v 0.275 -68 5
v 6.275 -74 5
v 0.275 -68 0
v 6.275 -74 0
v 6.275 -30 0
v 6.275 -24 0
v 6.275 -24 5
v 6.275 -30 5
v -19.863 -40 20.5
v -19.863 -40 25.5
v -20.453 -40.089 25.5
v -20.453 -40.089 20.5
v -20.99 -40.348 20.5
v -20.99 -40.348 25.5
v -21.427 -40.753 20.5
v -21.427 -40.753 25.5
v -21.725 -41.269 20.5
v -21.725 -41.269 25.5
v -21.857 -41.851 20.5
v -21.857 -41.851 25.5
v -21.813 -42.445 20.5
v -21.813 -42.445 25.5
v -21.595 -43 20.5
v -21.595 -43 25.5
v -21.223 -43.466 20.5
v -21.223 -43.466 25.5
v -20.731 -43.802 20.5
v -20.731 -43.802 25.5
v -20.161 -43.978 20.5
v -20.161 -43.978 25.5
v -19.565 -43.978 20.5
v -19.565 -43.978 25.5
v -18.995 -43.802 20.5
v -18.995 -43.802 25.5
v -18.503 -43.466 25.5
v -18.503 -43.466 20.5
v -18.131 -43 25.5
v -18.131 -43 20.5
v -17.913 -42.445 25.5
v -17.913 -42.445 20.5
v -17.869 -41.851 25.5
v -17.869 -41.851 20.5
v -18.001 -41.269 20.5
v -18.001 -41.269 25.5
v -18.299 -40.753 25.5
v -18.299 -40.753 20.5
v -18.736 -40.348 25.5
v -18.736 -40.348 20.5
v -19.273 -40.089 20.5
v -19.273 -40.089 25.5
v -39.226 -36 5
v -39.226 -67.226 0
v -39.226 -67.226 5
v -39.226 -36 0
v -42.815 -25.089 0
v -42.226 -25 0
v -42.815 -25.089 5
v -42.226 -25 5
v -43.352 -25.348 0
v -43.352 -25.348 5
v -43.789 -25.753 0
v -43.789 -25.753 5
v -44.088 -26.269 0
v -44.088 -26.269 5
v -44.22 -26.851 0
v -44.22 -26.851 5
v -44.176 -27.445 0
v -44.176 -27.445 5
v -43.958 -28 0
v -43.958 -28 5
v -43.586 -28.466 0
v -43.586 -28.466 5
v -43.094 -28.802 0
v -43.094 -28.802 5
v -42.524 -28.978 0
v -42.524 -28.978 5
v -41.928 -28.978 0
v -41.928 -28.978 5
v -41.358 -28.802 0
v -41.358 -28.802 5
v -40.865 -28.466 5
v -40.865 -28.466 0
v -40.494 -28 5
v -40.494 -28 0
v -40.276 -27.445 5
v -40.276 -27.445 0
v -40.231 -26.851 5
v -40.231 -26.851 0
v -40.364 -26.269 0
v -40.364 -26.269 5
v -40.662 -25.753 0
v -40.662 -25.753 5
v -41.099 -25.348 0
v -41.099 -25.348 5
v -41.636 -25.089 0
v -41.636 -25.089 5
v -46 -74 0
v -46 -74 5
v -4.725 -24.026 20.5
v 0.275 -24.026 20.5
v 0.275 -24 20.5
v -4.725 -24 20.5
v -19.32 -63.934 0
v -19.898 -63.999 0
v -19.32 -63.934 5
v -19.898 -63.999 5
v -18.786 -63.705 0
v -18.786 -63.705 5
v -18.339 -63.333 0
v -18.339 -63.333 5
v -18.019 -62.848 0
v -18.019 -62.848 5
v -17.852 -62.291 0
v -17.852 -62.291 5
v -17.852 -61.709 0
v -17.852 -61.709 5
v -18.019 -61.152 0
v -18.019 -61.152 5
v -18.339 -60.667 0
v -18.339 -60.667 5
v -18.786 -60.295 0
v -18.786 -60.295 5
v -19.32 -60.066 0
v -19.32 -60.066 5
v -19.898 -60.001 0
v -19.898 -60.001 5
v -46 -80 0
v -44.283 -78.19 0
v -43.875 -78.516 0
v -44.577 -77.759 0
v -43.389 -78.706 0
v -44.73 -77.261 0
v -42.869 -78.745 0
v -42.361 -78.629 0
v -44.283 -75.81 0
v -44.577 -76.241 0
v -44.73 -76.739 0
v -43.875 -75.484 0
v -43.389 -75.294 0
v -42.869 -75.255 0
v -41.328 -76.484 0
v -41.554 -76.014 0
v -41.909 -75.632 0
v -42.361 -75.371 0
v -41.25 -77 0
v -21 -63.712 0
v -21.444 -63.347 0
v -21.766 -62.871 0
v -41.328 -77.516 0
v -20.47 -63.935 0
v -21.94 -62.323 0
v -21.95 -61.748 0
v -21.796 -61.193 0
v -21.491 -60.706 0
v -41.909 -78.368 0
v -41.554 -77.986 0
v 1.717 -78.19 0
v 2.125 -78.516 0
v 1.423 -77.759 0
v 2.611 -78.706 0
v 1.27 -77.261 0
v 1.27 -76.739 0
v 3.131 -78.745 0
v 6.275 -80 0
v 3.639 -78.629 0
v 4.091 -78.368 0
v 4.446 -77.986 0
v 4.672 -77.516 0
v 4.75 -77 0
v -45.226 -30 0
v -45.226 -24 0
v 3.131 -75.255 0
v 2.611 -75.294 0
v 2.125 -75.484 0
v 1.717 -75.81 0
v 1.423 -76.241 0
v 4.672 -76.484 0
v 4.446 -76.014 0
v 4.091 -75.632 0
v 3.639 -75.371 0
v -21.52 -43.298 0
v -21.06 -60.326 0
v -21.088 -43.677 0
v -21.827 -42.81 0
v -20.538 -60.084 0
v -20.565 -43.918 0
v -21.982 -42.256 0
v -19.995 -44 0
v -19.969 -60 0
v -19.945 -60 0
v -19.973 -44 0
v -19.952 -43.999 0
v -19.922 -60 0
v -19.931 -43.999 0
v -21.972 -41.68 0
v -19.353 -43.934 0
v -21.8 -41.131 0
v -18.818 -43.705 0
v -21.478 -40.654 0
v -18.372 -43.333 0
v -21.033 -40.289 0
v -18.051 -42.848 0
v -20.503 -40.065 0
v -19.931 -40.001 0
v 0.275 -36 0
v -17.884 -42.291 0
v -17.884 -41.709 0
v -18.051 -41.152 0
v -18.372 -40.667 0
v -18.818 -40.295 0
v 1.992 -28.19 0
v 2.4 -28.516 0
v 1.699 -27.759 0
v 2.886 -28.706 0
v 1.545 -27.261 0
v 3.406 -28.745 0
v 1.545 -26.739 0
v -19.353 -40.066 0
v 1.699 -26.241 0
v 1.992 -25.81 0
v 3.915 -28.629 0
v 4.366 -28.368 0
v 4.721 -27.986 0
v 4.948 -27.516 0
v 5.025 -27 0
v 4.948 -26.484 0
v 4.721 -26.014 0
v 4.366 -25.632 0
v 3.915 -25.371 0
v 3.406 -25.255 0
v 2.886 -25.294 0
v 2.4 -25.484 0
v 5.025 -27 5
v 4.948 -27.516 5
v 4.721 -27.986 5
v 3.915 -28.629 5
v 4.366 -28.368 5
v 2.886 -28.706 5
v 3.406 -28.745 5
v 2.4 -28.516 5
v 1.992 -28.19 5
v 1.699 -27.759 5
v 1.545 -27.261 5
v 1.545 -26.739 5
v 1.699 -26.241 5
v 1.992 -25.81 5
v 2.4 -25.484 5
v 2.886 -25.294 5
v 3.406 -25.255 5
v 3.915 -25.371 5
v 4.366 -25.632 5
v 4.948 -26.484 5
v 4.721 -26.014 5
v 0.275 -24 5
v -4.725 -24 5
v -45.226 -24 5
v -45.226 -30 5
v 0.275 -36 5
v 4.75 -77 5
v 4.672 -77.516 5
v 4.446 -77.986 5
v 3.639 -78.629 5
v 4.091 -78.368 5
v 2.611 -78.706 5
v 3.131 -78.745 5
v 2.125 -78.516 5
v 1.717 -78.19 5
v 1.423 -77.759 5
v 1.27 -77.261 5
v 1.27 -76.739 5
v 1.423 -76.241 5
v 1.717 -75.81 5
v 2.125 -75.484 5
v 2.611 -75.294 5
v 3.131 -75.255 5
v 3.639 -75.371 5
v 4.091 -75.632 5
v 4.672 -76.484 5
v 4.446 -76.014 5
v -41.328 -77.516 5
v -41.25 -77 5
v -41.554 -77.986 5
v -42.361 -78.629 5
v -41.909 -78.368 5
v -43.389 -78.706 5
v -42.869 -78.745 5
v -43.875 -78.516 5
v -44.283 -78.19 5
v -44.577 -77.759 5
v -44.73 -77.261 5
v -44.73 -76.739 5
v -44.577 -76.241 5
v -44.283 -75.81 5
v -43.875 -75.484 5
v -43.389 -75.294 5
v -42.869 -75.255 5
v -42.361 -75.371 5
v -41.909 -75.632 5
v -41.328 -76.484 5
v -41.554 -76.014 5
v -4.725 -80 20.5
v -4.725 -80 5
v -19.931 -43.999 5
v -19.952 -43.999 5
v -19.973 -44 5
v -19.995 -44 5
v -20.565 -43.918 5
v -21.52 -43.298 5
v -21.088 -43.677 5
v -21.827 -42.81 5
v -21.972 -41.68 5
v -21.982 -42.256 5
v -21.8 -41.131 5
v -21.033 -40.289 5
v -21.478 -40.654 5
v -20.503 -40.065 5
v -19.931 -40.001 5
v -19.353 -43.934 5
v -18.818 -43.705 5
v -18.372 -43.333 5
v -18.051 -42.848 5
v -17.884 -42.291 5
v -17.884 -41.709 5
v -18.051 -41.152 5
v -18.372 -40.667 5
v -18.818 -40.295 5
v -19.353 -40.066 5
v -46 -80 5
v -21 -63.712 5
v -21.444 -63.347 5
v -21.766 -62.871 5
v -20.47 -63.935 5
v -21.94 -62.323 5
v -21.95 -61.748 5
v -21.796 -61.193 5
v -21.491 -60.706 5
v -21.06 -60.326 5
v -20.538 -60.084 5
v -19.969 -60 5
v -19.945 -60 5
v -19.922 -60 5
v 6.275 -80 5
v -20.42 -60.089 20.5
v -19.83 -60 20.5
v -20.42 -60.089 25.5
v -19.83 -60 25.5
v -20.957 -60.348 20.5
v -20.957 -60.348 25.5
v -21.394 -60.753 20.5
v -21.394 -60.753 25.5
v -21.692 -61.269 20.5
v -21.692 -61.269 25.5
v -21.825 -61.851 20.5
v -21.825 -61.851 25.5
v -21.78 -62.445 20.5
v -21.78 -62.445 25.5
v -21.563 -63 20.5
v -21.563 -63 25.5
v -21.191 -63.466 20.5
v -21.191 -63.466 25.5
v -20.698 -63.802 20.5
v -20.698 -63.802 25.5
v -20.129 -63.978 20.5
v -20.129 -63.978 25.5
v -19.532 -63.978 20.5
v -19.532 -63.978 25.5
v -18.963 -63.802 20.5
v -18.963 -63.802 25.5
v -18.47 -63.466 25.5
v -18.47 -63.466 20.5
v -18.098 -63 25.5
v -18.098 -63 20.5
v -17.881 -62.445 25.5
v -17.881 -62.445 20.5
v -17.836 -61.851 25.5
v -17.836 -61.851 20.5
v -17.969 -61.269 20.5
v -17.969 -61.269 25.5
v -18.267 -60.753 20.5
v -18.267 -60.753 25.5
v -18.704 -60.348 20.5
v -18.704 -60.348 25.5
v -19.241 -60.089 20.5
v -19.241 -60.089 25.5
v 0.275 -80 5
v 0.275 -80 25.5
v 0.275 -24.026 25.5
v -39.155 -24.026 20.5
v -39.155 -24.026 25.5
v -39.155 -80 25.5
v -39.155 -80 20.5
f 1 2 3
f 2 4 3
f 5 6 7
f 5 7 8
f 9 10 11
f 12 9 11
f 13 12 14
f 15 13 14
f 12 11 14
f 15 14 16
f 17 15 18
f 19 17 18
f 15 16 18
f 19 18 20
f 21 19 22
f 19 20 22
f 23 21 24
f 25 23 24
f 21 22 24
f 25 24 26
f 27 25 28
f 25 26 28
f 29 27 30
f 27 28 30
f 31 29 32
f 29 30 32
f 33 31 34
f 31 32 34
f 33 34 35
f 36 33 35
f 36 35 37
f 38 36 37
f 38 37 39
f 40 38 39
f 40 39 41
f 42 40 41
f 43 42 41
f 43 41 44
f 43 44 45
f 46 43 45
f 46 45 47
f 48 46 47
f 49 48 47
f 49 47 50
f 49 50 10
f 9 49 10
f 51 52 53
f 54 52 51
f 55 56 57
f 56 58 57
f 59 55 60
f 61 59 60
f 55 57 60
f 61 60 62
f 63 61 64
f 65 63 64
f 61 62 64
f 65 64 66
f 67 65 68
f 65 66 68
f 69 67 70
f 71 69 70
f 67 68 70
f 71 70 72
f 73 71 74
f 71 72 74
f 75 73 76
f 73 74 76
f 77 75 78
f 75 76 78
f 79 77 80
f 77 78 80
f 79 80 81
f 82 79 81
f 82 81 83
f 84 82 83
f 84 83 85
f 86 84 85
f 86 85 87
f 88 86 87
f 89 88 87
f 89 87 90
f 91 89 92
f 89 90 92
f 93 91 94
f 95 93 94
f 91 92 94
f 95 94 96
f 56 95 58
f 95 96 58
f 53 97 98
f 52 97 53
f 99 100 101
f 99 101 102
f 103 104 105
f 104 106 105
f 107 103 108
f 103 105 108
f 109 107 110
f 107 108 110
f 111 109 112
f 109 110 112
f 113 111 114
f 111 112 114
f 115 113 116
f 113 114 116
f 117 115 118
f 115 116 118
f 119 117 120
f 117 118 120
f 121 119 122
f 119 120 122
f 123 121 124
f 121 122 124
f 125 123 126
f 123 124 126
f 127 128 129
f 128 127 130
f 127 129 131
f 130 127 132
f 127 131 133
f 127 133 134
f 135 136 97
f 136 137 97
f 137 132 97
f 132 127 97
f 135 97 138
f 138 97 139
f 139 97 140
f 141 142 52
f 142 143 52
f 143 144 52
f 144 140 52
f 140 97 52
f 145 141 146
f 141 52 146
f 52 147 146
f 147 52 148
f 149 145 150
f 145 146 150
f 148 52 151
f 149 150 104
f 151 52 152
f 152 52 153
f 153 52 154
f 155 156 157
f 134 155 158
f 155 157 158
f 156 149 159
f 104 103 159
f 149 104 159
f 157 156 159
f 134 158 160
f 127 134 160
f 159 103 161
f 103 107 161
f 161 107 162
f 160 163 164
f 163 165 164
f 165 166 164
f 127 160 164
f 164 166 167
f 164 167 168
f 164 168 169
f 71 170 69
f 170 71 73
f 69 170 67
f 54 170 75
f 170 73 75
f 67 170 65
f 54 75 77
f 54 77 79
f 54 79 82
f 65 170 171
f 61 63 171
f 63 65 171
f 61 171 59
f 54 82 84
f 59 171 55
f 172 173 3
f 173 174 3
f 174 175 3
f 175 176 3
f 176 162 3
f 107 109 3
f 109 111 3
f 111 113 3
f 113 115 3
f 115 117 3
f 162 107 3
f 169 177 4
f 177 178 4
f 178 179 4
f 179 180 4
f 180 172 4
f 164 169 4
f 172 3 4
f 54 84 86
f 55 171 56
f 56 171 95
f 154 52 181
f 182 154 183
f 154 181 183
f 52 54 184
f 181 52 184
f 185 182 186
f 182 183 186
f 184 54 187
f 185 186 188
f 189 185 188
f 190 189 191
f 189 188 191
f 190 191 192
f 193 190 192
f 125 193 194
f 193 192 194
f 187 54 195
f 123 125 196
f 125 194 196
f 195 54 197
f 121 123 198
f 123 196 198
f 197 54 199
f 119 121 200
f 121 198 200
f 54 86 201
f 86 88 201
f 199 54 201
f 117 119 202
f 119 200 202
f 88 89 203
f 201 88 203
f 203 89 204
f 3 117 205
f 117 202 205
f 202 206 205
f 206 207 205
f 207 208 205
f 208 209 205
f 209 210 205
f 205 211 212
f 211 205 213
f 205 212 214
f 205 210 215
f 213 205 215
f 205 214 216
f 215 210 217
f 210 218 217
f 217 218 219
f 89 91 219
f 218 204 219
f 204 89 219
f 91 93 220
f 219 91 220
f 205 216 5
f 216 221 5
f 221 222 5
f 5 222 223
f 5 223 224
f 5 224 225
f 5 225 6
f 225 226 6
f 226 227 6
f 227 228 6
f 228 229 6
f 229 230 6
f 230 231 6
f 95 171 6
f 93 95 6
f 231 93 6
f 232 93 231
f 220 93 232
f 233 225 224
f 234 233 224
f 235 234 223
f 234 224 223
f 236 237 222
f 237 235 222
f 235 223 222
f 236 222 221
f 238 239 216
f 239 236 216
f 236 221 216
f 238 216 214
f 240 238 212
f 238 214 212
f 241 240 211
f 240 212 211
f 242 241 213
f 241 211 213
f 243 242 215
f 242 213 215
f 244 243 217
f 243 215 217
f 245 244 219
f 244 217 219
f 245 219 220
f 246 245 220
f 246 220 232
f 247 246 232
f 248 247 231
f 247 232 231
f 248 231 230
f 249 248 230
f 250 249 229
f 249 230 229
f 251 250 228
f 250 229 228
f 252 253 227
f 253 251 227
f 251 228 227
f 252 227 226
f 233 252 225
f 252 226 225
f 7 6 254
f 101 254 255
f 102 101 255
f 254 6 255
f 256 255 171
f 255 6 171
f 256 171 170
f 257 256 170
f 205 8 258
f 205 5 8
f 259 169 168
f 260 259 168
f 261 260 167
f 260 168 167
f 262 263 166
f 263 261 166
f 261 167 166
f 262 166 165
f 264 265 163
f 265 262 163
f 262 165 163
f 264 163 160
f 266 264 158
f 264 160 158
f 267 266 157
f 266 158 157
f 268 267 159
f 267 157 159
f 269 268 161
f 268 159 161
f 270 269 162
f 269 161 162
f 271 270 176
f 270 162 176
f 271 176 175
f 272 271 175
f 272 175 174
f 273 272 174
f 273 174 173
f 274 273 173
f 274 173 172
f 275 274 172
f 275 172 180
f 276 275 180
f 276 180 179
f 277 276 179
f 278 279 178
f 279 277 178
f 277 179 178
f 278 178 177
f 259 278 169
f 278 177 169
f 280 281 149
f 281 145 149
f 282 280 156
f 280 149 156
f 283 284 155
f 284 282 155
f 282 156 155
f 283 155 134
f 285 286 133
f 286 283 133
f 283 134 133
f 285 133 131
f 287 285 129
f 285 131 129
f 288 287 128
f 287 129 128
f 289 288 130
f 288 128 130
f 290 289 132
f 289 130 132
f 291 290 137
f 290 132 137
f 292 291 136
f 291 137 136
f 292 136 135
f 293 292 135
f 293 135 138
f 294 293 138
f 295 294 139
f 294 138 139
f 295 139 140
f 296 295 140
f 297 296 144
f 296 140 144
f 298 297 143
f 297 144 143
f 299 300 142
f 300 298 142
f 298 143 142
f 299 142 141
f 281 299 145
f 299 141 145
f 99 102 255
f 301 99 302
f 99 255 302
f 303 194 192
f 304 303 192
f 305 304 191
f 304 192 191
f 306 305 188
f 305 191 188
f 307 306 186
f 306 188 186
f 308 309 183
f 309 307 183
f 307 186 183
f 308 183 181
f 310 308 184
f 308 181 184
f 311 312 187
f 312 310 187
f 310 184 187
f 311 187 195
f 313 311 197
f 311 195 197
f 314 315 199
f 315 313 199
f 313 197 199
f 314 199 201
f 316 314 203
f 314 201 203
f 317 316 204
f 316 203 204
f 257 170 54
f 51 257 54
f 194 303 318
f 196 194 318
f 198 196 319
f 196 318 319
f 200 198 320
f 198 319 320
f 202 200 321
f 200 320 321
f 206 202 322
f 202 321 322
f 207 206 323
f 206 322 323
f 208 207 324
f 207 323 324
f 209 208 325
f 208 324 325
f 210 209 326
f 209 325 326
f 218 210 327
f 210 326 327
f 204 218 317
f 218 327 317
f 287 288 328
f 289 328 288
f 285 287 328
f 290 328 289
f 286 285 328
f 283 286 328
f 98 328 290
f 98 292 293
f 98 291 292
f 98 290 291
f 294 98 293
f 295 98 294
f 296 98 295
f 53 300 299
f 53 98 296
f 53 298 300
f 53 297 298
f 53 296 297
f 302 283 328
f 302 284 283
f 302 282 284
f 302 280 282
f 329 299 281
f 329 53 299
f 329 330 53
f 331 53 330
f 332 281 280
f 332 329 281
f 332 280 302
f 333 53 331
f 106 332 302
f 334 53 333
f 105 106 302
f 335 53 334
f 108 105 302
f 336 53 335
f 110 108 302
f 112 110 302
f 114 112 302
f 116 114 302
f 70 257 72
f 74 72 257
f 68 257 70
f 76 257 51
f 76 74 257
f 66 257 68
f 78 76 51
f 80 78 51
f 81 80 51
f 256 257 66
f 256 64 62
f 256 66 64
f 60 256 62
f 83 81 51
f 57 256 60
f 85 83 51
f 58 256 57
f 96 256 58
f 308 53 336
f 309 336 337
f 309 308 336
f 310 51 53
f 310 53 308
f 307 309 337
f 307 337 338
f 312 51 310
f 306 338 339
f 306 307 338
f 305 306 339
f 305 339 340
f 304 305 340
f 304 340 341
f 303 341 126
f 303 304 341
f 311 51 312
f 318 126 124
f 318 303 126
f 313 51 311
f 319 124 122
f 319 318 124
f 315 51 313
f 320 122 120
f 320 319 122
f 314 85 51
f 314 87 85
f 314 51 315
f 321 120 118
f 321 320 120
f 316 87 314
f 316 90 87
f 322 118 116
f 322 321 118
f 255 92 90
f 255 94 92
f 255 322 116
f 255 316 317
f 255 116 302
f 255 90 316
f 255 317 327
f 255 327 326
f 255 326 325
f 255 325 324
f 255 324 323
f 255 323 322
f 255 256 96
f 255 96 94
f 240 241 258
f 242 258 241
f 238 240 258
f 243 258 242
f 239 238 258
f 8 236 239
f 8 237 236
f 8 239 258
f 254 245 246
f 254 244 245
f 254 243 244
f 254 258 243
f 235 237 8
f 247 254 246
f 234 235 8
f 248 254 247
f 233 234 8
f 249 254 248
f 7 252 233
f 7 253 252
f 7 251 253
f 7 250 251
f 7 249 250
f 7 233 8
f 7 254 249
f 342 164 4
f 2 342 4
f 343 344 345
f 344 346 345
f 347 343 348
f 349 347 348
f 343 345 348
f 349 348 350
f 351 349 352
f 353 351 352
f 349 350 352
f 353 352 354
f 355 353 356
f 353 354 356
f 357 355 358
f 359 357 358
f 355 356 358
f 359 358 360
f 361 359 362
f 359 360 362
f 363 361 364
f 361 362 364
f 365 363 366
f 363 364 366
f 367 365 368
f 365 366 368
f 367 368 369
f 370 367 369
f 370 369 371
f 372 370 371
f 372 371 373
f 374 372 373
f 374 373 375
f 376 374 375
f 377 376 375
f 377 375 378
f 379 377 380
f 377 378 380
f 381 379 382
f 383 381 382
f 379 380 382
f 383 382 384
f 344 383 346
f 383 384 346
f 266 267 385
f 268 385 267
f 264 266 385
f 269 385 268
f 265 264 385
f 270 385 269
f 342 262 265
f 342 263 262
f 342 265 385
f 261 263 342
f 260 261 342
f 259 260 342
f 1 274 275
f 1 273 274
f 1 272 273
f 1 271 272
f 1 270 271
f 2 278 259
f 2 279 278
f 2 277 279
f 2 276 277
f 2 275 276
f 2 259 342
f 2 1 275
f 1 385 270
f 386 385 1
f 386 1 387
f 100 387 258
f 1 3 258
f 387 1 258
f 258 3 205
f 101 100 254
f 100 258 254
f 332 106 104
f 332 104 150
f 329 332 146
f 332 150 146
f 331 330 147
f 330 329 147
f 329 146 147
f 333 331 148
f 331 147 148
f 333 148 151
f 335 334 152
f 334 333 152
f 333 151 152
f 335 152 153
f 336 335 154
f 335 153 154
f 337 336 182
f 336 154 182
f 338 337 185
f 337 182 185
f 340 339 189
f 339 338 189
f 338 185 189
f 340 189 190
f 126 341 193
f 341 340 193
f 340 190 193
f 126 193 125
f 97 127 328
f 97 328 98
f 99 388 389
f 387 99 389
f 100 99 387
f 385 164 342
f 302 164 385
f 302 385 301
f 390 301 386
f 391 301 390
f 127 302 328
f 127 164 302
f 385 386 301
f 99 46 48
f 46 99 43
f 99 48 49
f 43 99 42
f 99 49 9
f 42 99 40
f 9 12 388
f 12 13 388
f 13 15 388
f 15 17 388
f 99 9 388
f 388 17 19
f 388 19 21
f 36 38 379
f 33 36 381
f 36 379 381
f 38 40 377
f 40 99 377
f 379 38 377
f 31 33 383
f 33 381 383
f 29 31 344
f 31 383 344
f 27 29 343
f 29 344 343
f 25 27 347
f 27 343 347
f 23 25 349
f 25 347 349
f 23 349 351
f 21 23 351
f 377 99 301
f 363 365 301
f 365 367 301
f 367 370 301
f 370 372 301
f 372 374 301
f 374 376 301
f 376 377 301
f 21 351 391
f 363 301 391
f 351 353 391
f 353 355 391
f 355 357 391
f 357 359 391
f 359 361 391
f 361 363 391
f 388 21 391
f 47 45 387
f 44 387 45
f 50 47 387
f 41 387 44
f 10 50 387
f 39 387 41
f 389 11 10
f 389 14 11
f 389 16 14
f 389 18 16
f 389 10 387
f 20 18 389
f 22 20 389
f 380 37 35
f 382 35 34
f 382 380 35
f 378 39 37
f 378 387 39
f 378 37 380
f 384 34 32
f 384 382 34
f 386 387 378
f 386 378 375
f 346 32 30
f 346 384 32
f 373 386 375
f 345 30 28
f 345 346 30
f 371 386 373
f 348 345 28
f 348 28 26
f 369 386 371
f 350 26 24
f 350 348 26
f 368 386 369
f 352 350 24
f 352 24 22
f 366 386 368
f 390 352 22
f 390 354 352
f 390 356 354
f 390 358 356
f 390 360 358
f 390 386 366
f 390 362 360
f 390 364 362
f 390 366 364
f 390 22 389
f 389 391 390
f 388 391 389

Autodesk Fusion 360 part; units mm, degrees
sketch "Sketch1" plane through (0, 0, 0) normal (0, 0, 1) x (1, 0, 0)
  circle A0 centre (-19.9657, -62) radius 2
  line L0 (6.2753, -74) -> (14.4853, -74) construction
  line L1 (0.2753, -24) -> (-39.2258, -24)
  line L2 (6.2753, -74) -> (0.2753, -68)
  line L3 (-39.2258, -80) -> (-39.2258, -52)
  circle A1 centre (3, -77) radius 1.75
  circle A2 centre (-43, -77) radius 1.75
  line L4 (6.2753, -80) -> (6.2753, -74)
  line L5 (0.2753, -80) -> (6.2753, -80)
  line L6 (0.2753, -52) -> (0.2753, -24)
  line L7 (-46, -80) -> (-46, -74)
  line L8 (-39.2258, -80) -> (-46, -80)
  circle A3 centre (3.2753, -27) radius 1.75
  line L9 (-39.2258, -24) -> (-45.2258, -24)
  line L10 (6.2753, -30) -> (0.2753, -36)
  line L11 (-45.2258, -24) -> (-45.2258, -30)
  line L12 (0.2753, -24) -> (6.2753, -24)
  line L13 (-45.2258, -30) -> (-37.5147, -30) construction
  line L14 (-45.2258, -30) -> (-39.2258, -36)
  circle A4 centre (-19.9982, -42) radius 2
  line L15 (6.2753, -24) -> (6.2753, -30)
  line L16 (0.2753, -52) -> (0.2753, -80)
  line L17 (-19.9982, -42) -> (-19.9657, -62)
  line L18 (0.2753, -80) -> (-39.2258, -80)
  line L19 (-46, -74) -> (-39.2258, -67.2258)
  line L20 (-39.2258, -52) -> (0.2753, -52)
  line L21 (-39.2258, -24) -> (-39.2258, -52)
  circle A5 centre (-42.2258, -27) radius 1.75
  point P0 (0.2753, -24)
  dimension "d16" = 4
  dimension "d20" = 20
  dimension "d21" = 4
  dimension "d30" = 6
  dimension "d31" = 6
  dimension "d32" = 135
  dimension "d33" = 3.5
  dimension "d34" = 6
  dimension "d35" = 6
  dimension "d36" = 3.5
  dimension "d37" = 6
  dimension "d38" = 6
  dimension "d39" = 45
  dimension "d41" = 135
  dimension "d42" = 3.5
  dimension "d54" = 10
  dimension "d52" = 56
  dimension "d53" = 3.5
  dimension "d55" = 3
  dimension "d56" = 28
extrude "Extrude1" add sketch "Sketch1" along normal blind 5 contours L3 L16 L18 L20 | L1 L6 L20 L21
extrude "Extrude2" add sketch "Sketch1" along normal blind 5 contours L3 L7 L8 L19 | L9 L11 L14 L21 | L6 L10 L12 L15 | L2 L4 L5 L16
sketch "Sketch2" plane through (0, 0, 5) normal (0, 0, 1) x (-1, 0, 0)
  circle A0 centre (-3, 77) radius 1.75
  circle A1 centre (43, 77) radius 1.75
  circle A2 centre (-3.2753, 27) radius 1.75
  circle A3 centre (19.9982, 42) radius 2
  circle A4 centre (19.9657, 62) radius 2
  line L0 (-0.2753, 68) -> (-0.2753, 36)
  line L1 (-0.2753, 36) -> (-6.2753, 30)
  line L2 (-6.2753, 30) -> (-6.2753, 24)
  line L3 (-6.2753, 24) -> (45.2258, 24)
  line L4 (45.2258, 24) -> (45.2258, 30)
  line L5 (45.2258, 30) -> (39.2258, 36)
  line L6 (39.2258, 36) -> (39.2258, 67.2258)
  line L7 (39.2258, 67.2258) -> (46, 74)
  line L8 (46, 74) -> (46, 80)
  line L9 (46, 80) -> (-6.2753, 80)
  line L10 (-6.2753, 80) -> (-6.2753, 74)
  line L11 (-6.2753, 74) -> (-0.2753, 68)
  line L12 (4.7247, 24) -> (4.7247, 104)
  line L13 (-0.2753, 52) -> (-0.2753, 24)
  line L14 (-0.2753, 24) -> (-0.2753, 80)
  dimension "d25" = 80
  dimension "d26" = 5
extrude "Extrude3" add sketch "Sketch2" along normal blind 15.5 contours L0 L3 L9 L12 L13 L14
sketch "Sketch3" plane through (0, 0, 20.5) normal (0, 0, 1) x (-1, 0, 0)
  line L0 (4.7247, 24) -> (4.7247, 80)
  line L1 (4.7247, 80) -> (-0.2753, 80)
  line L2 (-0.2753, 80) -> (-0.2753, 24)
  line L3 (-0.2753, 24) -> (4.7247, 24)
  line L4 (39.1553, 24.0265) -> (-0.2753, 24.0265)
  line L5 (-0.2753, 80) -> (39.1553, 80)
  line L6 (39.1553, 80) -> (39.1553, 24.0265)
extrude "Extrude4" add sketch "Sketch3" along normal blind 5 contours L0 L1 L2 L4 L5
extrude "Extrude5" add sketch "Sketch3" along normal blind 5 contours L0 L4 L5 L6
hole "Hole1" at (-19.8305, -62, 0) direction (0, 0, 1) diameter 4 depth 31 tip angle 118
hole "Hole2" at (-19.863, -42, 0) direction (0, 0, 1) diameter 4 depth 30 tip angle 118
hole "Hole3" at (-42.2258, -27, 0) direction (0, 0, 1) diameter 4 depth 11 tip angle 118
equation "d54 = d20 / 2"
equation "d56 = d52 / 2"
